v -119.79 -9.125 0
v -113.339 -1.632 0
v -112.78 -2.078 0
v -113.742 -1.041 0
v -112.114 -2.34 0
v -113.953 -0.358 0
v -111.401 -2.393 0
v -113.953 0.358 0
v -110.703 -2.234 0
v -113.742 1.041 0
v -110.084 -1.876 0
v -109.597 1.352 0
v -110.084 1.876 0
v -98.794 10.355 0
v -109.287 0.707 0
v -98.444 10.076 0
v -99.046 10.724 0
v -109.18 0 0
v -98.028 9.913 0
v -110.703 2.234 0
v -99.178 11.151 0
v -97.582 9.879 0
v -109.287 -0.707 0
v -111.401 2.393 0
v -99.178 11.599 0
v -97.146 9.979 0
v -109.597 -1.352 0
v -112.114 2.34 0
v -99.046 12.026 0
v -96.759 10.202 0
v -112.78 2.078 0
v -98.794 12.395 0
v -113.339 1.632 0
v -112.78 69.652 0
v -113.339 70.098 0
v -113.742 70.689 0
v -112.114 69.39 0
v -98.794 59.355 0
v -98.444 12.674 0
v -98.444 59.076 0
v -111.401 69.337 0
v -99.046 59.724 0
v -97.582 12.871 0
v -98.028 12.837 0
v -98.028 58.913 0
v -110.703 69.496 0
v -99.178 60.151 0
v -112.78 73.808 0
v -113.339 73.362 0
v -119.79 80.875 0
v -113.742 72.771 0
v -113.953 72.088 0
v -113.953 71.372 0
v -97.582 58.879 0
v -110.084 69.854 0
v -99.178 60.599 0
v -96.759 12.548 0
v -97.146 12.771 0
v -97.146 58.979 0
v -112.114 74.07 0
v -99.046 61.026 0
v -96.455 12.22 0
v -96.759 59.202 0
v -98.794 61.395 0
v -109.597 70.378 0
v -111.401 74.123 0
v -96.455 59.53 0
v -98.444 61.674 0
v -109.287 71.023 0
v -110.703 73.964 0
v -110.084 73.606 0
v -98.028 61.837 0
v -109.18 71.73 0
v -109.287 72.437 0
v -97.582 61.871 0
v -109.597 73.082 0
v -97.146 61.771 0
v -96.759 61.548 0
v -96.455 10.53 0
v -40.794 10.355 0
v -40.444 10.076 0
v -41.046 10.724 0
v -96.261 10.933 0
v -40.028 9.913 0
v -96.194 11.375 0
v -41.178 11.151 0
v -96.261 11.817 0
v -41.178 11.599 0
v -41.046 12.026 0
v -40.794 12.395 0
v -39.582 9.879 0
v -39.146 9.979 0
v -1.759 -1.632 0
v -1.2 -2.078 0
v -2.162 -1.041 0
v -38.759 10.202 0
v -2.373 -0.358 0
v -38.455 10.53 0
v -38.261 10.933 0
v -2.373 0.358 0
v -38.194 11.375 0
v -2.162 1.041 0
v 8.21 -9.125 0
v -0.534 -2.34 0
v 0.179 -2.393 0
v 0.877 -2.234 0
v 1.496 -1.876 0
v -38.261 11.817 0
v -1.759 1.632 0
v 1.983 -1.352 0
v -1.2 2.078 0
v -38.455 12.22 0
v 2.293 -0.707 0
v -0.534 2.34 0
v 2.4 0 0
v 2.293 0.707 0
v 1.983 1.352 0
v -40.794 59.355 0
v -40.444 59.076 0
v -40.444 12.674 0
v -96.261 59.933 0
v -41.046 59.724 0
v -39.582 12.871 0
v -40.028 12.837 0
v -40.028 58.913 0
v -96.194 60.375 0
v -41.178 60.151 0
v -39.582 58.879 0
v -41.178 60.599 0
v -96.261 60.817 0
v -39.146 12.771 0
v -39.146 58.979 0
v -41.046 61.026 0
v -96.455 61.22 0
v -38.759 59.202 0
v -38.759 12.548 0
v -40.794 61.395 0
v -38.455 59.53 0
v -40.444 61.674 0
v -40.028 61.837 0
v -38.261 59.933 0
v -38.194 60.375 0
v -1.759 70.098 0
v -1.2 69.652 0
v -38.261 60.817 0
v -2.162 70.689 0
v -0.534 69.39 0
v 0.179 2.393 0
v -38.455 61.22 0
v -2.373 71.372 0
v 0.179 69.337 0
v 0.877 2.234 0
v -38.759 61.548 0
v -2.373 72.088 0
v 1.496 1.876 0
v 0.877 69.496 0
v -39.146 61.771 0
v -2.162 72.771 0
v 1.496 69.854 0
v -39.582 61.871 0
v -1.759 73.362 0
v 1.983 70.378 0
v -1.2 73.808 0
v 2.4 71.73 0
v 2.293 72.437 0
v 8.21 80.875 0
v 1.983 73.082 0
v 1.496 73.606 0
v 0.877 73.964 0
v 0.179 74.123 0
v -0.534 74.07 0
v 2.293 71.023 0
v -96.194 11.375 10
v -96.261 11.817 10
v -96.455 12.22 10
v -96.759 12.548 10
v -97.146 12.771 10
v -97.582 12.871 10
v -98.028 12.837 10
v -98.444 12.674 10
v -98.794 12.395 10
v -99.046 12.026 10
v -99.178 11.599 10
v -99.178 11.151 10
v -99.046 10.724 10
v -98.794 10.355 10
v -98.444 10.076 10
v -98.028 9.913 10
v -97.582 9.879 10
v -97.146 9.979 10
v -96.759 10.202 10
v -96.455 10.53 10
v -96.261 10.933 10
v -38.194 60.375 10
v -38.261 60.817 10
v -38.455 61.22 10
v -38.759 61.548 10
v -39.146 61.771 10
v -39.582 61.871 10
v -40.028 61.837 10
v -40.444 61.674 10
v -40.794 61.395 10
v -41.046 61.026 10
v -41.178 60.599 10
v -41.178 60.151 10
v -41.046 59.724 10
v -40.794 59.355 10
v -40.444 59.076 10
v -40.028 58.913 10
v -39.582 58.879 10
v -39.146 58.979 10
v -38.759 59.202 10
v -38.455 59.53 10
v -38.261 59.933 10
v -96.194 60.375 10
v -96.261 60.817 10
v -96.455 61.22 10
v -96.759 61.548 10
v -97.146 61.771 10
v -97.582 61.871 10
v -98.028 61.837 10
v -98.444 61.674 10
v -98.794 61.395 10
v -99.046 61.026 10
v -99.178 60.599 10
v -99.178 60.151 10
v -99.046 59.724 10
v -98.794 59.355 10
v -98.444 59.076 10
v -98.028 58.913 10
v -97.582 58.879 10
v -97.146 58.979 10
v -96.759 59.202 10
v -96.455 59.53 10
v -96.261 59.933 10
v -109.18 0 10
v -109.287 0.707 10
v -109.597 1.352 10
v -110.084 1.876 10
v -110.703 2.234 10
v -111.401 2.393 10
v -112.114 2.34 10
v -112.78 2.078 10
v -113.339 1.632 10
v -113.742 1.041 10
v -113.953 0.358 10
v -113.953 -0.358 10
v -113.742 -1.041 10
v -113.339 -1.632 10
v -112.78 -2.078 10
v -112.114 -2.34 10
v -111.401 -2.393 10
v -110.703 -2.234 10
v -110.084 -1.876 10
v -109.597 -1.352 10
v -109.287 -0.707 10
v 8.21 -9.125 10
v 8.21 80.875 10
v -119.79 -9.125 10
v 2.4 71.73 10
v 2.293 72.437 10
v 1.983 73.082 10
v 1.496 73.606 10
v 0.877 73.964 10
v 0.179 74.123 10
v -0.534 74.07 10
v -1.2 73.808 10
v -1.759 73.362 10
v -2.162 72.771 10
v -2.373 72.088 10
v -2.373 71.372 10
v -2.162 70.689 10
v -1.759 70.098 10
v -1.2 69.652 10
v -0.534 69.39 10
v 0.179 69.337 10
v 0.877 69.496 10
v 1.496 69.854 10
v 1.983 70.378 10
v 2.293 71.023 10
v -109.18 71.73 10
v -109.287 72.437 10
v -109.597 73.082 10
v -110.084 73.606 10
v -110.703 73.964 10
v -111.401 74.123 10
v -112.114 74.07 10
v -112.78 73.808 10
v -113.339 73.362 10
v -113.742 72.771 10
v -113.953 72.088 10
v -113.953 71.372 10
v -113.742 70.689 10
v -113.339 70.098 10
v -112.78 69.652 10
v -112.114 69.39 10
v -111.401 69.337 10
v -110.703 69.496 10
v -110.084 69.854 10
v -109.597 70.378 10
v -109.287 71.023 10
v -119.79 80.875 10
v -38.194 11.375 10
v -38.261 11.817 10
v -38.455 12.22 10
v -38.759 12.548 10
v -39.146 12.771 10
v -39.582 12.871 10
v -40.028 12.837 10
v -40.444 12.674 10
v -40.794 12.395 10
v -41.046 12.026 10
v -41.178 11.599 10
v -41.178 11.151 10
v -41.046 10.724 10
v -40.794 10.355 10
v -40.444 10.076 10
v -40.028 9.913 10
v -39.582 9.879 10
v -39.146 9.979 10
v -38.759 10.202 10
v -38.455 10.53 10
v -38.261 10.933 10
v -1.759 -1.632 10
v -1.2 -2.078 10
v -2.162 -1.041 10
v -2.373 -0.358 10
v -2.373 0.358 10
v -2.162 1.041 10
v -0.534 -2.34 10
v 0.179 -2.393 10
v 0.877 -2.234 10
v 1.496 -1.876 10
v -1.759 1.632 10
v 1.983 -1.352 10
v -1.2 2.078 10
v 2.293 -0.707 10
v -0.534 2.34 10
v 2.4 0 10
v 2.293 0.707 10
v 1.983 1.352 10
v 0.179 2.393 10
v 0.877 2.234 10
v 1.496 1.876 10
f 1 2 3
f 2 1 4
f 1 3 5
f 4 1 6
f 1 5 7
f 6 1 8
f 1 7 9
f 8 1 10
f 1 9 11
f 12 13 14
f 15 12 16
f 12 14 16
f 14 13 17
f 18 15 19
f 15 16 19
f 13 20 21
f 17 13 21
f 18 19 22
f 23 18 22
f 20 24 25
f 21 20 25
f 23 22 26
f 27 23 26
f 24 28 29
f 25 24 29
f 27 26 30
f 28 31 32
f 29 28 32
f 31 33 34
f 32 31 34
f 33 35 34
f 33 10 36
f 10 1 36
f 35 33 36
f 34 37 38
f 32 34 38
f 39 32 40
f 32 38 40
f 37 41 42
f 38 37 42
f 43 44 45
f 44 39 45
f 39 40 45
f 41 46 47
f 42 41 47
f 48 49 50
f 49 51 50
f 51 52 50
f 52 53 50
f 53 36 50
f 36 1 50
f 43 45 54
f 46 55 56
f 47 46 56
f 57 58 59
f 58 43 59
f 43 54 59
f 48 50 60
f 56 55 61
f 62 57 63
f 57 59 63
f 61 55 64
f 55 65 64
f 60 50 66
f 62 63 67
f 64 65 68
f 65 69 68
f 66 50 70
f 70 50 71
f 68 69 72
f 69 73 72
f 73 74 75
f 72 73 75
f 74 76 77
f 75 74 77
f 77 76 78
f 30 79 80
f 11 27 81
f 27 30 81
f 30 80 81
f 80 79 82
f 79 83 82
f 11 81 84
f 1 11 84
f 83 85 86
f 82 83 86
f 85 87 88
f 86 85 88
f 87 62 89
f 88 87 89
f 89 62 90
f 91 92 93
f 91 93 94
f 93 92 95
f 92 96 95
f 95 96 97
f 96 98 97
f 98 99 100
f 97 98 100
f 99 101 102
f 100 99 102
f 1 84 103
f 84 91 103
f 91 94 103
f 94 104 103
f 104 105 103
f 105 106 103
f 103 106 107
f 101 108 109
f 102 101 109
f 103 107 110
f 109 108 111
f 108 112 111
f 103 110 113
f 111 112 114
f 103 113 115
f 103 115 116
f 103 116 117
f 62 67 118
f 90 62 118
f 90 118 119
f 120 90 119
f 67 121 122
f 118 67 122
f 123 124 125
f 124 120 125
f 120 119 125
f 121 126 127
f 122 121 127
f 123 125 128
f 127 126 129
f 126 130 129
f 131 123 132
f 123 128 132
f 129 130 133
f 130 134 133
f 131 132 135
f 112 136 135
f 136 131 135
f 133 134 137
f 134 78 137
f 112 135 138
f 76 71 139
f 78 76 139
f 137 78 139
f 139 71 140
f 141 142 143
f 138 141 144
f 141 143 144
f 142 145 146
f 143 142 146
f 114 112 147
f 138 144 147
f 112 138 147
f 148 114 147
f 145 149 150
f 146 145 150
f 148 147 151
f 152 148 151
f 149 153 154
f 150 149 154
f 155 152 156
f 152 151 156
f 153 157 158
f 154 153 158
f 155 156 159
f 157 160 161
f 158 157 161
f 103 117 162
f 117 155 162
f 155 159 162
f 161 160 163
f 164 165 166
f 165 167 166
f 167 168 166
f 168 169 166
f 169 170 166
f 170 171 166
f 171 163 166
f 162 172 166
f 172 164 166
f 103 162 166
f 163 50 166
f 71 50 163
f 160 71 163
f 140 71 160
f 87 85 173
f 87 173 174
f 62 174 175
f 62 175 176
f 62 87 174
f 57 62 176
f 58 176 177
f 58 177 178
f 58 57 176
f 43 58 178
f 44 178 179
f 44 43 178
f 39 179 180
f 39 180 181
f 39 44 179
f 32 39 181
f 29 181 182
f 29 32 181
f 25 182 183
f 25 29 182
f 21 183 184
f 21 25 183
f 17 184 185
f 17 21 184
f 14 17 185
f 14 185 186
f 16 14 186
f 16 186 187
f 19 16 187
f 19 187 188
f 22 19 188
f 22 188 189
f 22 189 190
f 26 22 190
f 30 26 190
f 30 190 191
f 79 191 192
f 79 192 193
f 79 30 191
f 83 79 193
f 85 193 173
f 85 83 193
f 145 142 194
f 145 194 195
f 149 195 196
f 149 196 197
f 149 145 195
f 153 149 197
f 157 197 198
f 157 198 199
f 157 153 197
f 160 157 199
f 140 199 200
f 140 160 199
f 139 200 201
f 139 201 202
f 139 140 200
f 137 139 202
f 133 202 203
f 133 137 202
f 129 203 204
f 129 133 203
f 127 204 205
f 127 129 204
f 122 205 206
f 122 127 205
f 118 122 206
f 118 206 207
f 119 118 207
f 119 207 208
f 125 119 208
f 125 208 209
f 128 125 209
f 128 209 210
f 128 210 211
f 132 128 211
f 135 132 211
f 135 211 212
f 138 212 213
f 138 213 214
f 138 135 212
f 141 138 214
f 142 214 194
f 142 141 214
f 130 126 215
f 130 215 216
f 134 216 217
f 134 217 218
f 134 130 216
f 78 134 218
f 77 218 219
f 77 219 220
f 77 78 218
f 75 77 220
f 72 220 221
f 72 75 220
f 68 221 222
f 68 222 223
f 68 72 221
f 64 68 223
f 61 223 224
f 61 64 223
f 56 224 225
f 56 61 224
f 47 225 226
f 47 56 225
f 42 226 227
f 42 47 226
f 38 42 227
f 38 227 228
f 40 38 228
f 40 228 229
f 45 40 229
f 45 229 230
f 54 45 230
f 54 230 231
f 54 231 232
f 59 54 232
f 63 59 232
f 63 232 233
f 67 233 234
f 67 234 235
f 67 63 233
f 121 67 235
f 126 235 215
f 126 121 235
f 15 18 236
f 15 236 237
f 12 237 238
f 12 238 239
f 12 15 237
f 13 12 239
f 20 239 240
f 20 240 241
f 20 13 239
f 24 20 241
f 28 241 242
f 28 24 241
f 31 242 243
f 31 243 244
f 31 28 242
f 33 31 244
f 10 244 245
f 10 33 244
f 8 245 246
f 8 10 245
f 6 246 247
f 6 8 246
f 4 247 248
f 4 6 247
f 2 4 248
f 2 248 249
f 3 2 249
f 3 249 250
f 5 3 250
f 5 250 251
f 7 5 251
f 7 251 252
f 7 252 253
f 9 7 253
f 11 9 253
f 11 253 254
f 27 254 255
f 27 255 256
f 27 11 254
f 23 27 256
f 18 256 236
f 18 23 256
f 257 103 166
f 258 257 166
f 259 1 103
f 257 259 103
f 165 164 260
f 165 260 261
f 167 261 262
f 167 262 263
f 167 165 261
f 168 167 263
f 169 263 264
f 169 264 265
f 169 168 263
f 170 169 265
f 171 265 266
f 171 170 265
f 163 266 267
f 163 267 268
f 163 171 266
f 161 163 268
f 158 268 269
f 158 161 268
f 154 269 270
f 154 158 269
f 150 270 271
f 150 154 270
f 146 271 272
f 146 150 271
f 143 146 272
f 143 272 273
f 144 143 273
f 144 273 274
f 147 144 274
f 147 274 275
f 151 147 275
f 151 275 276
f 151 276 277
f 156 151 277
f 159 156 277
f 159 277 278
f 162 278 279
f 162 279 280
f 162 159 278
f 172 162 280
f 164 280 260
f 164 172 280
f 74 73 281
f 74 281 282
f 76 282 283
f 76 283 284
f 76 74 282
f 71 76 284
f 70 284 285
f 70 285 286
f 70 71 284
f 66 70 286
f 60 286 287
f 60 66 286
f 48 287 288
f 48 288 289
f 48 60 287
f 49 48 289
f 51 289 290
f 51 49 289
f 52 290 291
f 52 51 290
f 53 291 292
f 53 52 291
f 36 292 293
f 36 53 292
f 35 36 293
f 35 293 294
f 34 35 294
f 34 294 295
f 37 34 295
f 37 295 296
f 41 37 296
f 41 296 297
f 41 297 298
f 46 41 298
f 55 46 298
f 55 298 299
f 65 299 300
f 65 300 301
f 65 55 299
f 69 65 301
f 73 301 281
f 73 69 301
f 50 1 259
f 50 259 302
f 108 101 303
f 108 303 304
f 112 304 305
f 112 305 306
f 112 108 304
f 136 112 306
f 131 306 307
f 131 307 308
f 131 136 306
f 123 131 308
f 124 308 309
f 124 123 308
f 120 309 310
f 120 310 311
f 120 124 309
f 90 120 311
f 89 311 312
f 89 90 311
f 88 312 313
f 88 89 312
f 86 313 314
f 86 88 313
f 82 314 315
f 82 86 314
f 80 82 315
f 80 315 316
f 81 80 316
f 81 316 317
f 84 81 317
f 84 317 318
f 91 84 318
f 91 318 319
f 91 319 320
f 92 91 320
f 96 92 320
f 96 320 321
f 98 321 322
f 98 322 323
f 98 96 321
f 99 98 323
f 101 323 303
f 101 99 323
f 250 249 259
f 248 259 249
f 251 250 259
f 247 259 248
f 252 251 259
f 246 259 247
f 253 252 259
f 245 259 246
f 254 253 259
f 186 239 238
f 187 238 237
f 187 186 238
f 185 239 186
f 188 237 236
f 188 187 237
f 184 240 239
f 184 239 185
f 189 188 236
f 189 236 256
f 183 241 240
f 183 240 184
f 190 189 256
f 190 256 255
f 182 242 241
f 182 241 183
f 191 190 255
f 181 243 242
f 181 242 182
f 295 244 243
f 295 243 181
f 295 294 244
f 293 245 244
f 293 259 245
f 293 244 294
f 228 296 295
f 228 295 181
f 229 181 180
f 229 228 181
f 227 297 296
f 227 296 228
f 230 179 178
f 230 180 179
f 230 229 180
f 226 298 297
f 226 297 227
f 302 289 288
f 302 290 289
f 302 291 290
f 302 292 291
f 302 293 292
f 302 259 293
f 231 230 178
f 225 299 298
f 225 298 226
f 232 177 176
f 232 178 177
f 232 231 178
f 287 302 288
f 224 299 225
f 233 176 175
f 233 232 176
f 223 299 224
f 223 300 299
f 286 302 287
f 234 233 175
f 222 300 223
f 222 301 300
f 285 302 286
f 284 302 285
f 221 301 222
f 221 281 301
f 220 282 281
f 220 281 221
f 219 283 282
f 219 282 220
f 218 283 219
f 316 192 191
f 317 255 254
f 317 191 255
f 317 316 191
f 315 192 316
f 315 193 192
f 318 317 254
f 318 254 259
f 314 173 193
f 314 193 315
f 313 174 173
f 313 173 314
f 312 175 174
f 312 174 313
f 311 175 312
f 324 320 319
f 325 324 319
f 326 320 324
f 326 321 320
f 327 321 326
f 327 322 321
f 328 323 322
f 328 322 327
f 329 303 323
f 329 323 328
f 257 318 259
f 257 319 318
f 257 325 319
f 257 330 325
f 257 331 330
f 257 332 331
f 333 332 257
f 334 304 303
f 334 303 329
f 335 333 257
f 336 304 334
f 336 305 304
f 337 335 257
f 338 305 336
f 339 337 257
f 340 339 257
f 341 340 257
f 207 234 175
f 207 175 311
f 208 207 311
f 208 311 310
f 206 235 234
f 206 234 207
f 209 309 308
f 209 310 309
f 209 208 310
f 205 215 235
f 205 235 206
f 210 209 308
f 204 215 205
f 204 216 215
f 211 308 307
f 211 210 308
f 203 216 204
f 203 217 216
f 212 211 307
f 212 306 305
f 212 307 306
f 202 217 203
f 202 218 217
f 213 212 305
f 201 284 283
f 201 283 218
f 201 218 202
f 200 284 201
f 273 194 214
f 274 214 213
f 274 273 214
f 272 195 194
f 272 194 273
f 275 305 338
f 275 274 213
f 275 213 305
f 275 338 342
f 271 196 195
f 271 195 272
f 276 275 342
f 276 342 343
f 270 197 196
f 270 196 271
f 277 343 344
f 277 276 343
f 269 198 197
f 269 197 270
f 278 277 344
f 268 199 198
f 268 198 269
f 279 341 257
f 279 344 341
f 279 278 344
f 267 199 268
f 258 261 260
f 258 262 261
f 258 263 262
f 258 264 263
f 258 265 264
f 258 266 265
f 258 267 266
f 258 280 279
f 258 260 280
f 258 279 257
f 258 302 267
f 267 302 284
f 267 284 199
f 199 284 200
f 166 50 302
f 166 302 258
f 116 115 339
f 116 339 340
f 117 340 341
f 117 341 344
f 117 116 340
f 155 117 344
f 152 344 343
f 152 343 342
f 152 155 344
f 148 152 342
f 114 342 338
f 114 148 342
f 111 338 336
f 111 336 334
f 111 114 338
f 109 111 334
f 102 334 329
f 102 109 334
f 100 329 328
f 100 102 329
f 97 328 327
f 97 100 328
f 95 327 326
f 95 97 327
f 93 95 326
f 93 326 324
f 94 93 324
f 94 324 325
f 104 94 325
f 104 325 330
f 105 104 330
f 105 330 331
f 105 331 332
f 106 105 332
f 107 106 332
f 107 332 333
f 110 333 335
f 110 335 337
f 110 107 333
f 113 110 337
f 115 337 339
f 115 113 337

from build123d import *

# Parameters (mm, degrees)
SKETCH1_W           = 128
SKETCH1_H           = 90
SKETCH1_R           = 2.4
SKETCH1_R_2         = 1.5
BOSS_EXTRUDE3_DEPTH = 10


with BuildPart() as part:
    # Sketch1 → Boss-Extrude3 (new body)
    with BuildSketch(Plane.XY):
        with Locations((-55.79, 35.875)):
            Rectangle(SKETCH1_W, SKETCH1_H)
        with Locations((0, 71.73)):
            Circle(SKETCH1_R, mode=Mode.SUBTRACT)
        with Locations((-111.58, 0)):
            Circle(SKETCH1_R, mode=Mode.SUBTRACT)
        Circle(SKETCH1_R, mode=Mode.SUBTRACT)
        with Locations((-111.58, 71.73)):
            Circle(SKETCH1_R, mode=Mode.SUBTRACT)
        with Locations((-97.694375804, 60.375)):
            Circle(SKETCH1_R_2, mode=Mode.SUBTRACT)
        with Locations((-39.694375804, 60.375)):
            Circle(SKETCH1_R_2, mode=Mode.SUBTRACT)
        with Locations((-39.694375804, 11.375)):
            Circle(SKETCH1_R_2, mode=Mode.SUBTRACT)
        with Locations((-97.694375804, 11.375)):
            Circle(SKETCH1_R_2, mode=Mode.SUBTRACT)
    extrude(amount=BOSS_EXTRUDE3_DEPTH)


solid = part.part
